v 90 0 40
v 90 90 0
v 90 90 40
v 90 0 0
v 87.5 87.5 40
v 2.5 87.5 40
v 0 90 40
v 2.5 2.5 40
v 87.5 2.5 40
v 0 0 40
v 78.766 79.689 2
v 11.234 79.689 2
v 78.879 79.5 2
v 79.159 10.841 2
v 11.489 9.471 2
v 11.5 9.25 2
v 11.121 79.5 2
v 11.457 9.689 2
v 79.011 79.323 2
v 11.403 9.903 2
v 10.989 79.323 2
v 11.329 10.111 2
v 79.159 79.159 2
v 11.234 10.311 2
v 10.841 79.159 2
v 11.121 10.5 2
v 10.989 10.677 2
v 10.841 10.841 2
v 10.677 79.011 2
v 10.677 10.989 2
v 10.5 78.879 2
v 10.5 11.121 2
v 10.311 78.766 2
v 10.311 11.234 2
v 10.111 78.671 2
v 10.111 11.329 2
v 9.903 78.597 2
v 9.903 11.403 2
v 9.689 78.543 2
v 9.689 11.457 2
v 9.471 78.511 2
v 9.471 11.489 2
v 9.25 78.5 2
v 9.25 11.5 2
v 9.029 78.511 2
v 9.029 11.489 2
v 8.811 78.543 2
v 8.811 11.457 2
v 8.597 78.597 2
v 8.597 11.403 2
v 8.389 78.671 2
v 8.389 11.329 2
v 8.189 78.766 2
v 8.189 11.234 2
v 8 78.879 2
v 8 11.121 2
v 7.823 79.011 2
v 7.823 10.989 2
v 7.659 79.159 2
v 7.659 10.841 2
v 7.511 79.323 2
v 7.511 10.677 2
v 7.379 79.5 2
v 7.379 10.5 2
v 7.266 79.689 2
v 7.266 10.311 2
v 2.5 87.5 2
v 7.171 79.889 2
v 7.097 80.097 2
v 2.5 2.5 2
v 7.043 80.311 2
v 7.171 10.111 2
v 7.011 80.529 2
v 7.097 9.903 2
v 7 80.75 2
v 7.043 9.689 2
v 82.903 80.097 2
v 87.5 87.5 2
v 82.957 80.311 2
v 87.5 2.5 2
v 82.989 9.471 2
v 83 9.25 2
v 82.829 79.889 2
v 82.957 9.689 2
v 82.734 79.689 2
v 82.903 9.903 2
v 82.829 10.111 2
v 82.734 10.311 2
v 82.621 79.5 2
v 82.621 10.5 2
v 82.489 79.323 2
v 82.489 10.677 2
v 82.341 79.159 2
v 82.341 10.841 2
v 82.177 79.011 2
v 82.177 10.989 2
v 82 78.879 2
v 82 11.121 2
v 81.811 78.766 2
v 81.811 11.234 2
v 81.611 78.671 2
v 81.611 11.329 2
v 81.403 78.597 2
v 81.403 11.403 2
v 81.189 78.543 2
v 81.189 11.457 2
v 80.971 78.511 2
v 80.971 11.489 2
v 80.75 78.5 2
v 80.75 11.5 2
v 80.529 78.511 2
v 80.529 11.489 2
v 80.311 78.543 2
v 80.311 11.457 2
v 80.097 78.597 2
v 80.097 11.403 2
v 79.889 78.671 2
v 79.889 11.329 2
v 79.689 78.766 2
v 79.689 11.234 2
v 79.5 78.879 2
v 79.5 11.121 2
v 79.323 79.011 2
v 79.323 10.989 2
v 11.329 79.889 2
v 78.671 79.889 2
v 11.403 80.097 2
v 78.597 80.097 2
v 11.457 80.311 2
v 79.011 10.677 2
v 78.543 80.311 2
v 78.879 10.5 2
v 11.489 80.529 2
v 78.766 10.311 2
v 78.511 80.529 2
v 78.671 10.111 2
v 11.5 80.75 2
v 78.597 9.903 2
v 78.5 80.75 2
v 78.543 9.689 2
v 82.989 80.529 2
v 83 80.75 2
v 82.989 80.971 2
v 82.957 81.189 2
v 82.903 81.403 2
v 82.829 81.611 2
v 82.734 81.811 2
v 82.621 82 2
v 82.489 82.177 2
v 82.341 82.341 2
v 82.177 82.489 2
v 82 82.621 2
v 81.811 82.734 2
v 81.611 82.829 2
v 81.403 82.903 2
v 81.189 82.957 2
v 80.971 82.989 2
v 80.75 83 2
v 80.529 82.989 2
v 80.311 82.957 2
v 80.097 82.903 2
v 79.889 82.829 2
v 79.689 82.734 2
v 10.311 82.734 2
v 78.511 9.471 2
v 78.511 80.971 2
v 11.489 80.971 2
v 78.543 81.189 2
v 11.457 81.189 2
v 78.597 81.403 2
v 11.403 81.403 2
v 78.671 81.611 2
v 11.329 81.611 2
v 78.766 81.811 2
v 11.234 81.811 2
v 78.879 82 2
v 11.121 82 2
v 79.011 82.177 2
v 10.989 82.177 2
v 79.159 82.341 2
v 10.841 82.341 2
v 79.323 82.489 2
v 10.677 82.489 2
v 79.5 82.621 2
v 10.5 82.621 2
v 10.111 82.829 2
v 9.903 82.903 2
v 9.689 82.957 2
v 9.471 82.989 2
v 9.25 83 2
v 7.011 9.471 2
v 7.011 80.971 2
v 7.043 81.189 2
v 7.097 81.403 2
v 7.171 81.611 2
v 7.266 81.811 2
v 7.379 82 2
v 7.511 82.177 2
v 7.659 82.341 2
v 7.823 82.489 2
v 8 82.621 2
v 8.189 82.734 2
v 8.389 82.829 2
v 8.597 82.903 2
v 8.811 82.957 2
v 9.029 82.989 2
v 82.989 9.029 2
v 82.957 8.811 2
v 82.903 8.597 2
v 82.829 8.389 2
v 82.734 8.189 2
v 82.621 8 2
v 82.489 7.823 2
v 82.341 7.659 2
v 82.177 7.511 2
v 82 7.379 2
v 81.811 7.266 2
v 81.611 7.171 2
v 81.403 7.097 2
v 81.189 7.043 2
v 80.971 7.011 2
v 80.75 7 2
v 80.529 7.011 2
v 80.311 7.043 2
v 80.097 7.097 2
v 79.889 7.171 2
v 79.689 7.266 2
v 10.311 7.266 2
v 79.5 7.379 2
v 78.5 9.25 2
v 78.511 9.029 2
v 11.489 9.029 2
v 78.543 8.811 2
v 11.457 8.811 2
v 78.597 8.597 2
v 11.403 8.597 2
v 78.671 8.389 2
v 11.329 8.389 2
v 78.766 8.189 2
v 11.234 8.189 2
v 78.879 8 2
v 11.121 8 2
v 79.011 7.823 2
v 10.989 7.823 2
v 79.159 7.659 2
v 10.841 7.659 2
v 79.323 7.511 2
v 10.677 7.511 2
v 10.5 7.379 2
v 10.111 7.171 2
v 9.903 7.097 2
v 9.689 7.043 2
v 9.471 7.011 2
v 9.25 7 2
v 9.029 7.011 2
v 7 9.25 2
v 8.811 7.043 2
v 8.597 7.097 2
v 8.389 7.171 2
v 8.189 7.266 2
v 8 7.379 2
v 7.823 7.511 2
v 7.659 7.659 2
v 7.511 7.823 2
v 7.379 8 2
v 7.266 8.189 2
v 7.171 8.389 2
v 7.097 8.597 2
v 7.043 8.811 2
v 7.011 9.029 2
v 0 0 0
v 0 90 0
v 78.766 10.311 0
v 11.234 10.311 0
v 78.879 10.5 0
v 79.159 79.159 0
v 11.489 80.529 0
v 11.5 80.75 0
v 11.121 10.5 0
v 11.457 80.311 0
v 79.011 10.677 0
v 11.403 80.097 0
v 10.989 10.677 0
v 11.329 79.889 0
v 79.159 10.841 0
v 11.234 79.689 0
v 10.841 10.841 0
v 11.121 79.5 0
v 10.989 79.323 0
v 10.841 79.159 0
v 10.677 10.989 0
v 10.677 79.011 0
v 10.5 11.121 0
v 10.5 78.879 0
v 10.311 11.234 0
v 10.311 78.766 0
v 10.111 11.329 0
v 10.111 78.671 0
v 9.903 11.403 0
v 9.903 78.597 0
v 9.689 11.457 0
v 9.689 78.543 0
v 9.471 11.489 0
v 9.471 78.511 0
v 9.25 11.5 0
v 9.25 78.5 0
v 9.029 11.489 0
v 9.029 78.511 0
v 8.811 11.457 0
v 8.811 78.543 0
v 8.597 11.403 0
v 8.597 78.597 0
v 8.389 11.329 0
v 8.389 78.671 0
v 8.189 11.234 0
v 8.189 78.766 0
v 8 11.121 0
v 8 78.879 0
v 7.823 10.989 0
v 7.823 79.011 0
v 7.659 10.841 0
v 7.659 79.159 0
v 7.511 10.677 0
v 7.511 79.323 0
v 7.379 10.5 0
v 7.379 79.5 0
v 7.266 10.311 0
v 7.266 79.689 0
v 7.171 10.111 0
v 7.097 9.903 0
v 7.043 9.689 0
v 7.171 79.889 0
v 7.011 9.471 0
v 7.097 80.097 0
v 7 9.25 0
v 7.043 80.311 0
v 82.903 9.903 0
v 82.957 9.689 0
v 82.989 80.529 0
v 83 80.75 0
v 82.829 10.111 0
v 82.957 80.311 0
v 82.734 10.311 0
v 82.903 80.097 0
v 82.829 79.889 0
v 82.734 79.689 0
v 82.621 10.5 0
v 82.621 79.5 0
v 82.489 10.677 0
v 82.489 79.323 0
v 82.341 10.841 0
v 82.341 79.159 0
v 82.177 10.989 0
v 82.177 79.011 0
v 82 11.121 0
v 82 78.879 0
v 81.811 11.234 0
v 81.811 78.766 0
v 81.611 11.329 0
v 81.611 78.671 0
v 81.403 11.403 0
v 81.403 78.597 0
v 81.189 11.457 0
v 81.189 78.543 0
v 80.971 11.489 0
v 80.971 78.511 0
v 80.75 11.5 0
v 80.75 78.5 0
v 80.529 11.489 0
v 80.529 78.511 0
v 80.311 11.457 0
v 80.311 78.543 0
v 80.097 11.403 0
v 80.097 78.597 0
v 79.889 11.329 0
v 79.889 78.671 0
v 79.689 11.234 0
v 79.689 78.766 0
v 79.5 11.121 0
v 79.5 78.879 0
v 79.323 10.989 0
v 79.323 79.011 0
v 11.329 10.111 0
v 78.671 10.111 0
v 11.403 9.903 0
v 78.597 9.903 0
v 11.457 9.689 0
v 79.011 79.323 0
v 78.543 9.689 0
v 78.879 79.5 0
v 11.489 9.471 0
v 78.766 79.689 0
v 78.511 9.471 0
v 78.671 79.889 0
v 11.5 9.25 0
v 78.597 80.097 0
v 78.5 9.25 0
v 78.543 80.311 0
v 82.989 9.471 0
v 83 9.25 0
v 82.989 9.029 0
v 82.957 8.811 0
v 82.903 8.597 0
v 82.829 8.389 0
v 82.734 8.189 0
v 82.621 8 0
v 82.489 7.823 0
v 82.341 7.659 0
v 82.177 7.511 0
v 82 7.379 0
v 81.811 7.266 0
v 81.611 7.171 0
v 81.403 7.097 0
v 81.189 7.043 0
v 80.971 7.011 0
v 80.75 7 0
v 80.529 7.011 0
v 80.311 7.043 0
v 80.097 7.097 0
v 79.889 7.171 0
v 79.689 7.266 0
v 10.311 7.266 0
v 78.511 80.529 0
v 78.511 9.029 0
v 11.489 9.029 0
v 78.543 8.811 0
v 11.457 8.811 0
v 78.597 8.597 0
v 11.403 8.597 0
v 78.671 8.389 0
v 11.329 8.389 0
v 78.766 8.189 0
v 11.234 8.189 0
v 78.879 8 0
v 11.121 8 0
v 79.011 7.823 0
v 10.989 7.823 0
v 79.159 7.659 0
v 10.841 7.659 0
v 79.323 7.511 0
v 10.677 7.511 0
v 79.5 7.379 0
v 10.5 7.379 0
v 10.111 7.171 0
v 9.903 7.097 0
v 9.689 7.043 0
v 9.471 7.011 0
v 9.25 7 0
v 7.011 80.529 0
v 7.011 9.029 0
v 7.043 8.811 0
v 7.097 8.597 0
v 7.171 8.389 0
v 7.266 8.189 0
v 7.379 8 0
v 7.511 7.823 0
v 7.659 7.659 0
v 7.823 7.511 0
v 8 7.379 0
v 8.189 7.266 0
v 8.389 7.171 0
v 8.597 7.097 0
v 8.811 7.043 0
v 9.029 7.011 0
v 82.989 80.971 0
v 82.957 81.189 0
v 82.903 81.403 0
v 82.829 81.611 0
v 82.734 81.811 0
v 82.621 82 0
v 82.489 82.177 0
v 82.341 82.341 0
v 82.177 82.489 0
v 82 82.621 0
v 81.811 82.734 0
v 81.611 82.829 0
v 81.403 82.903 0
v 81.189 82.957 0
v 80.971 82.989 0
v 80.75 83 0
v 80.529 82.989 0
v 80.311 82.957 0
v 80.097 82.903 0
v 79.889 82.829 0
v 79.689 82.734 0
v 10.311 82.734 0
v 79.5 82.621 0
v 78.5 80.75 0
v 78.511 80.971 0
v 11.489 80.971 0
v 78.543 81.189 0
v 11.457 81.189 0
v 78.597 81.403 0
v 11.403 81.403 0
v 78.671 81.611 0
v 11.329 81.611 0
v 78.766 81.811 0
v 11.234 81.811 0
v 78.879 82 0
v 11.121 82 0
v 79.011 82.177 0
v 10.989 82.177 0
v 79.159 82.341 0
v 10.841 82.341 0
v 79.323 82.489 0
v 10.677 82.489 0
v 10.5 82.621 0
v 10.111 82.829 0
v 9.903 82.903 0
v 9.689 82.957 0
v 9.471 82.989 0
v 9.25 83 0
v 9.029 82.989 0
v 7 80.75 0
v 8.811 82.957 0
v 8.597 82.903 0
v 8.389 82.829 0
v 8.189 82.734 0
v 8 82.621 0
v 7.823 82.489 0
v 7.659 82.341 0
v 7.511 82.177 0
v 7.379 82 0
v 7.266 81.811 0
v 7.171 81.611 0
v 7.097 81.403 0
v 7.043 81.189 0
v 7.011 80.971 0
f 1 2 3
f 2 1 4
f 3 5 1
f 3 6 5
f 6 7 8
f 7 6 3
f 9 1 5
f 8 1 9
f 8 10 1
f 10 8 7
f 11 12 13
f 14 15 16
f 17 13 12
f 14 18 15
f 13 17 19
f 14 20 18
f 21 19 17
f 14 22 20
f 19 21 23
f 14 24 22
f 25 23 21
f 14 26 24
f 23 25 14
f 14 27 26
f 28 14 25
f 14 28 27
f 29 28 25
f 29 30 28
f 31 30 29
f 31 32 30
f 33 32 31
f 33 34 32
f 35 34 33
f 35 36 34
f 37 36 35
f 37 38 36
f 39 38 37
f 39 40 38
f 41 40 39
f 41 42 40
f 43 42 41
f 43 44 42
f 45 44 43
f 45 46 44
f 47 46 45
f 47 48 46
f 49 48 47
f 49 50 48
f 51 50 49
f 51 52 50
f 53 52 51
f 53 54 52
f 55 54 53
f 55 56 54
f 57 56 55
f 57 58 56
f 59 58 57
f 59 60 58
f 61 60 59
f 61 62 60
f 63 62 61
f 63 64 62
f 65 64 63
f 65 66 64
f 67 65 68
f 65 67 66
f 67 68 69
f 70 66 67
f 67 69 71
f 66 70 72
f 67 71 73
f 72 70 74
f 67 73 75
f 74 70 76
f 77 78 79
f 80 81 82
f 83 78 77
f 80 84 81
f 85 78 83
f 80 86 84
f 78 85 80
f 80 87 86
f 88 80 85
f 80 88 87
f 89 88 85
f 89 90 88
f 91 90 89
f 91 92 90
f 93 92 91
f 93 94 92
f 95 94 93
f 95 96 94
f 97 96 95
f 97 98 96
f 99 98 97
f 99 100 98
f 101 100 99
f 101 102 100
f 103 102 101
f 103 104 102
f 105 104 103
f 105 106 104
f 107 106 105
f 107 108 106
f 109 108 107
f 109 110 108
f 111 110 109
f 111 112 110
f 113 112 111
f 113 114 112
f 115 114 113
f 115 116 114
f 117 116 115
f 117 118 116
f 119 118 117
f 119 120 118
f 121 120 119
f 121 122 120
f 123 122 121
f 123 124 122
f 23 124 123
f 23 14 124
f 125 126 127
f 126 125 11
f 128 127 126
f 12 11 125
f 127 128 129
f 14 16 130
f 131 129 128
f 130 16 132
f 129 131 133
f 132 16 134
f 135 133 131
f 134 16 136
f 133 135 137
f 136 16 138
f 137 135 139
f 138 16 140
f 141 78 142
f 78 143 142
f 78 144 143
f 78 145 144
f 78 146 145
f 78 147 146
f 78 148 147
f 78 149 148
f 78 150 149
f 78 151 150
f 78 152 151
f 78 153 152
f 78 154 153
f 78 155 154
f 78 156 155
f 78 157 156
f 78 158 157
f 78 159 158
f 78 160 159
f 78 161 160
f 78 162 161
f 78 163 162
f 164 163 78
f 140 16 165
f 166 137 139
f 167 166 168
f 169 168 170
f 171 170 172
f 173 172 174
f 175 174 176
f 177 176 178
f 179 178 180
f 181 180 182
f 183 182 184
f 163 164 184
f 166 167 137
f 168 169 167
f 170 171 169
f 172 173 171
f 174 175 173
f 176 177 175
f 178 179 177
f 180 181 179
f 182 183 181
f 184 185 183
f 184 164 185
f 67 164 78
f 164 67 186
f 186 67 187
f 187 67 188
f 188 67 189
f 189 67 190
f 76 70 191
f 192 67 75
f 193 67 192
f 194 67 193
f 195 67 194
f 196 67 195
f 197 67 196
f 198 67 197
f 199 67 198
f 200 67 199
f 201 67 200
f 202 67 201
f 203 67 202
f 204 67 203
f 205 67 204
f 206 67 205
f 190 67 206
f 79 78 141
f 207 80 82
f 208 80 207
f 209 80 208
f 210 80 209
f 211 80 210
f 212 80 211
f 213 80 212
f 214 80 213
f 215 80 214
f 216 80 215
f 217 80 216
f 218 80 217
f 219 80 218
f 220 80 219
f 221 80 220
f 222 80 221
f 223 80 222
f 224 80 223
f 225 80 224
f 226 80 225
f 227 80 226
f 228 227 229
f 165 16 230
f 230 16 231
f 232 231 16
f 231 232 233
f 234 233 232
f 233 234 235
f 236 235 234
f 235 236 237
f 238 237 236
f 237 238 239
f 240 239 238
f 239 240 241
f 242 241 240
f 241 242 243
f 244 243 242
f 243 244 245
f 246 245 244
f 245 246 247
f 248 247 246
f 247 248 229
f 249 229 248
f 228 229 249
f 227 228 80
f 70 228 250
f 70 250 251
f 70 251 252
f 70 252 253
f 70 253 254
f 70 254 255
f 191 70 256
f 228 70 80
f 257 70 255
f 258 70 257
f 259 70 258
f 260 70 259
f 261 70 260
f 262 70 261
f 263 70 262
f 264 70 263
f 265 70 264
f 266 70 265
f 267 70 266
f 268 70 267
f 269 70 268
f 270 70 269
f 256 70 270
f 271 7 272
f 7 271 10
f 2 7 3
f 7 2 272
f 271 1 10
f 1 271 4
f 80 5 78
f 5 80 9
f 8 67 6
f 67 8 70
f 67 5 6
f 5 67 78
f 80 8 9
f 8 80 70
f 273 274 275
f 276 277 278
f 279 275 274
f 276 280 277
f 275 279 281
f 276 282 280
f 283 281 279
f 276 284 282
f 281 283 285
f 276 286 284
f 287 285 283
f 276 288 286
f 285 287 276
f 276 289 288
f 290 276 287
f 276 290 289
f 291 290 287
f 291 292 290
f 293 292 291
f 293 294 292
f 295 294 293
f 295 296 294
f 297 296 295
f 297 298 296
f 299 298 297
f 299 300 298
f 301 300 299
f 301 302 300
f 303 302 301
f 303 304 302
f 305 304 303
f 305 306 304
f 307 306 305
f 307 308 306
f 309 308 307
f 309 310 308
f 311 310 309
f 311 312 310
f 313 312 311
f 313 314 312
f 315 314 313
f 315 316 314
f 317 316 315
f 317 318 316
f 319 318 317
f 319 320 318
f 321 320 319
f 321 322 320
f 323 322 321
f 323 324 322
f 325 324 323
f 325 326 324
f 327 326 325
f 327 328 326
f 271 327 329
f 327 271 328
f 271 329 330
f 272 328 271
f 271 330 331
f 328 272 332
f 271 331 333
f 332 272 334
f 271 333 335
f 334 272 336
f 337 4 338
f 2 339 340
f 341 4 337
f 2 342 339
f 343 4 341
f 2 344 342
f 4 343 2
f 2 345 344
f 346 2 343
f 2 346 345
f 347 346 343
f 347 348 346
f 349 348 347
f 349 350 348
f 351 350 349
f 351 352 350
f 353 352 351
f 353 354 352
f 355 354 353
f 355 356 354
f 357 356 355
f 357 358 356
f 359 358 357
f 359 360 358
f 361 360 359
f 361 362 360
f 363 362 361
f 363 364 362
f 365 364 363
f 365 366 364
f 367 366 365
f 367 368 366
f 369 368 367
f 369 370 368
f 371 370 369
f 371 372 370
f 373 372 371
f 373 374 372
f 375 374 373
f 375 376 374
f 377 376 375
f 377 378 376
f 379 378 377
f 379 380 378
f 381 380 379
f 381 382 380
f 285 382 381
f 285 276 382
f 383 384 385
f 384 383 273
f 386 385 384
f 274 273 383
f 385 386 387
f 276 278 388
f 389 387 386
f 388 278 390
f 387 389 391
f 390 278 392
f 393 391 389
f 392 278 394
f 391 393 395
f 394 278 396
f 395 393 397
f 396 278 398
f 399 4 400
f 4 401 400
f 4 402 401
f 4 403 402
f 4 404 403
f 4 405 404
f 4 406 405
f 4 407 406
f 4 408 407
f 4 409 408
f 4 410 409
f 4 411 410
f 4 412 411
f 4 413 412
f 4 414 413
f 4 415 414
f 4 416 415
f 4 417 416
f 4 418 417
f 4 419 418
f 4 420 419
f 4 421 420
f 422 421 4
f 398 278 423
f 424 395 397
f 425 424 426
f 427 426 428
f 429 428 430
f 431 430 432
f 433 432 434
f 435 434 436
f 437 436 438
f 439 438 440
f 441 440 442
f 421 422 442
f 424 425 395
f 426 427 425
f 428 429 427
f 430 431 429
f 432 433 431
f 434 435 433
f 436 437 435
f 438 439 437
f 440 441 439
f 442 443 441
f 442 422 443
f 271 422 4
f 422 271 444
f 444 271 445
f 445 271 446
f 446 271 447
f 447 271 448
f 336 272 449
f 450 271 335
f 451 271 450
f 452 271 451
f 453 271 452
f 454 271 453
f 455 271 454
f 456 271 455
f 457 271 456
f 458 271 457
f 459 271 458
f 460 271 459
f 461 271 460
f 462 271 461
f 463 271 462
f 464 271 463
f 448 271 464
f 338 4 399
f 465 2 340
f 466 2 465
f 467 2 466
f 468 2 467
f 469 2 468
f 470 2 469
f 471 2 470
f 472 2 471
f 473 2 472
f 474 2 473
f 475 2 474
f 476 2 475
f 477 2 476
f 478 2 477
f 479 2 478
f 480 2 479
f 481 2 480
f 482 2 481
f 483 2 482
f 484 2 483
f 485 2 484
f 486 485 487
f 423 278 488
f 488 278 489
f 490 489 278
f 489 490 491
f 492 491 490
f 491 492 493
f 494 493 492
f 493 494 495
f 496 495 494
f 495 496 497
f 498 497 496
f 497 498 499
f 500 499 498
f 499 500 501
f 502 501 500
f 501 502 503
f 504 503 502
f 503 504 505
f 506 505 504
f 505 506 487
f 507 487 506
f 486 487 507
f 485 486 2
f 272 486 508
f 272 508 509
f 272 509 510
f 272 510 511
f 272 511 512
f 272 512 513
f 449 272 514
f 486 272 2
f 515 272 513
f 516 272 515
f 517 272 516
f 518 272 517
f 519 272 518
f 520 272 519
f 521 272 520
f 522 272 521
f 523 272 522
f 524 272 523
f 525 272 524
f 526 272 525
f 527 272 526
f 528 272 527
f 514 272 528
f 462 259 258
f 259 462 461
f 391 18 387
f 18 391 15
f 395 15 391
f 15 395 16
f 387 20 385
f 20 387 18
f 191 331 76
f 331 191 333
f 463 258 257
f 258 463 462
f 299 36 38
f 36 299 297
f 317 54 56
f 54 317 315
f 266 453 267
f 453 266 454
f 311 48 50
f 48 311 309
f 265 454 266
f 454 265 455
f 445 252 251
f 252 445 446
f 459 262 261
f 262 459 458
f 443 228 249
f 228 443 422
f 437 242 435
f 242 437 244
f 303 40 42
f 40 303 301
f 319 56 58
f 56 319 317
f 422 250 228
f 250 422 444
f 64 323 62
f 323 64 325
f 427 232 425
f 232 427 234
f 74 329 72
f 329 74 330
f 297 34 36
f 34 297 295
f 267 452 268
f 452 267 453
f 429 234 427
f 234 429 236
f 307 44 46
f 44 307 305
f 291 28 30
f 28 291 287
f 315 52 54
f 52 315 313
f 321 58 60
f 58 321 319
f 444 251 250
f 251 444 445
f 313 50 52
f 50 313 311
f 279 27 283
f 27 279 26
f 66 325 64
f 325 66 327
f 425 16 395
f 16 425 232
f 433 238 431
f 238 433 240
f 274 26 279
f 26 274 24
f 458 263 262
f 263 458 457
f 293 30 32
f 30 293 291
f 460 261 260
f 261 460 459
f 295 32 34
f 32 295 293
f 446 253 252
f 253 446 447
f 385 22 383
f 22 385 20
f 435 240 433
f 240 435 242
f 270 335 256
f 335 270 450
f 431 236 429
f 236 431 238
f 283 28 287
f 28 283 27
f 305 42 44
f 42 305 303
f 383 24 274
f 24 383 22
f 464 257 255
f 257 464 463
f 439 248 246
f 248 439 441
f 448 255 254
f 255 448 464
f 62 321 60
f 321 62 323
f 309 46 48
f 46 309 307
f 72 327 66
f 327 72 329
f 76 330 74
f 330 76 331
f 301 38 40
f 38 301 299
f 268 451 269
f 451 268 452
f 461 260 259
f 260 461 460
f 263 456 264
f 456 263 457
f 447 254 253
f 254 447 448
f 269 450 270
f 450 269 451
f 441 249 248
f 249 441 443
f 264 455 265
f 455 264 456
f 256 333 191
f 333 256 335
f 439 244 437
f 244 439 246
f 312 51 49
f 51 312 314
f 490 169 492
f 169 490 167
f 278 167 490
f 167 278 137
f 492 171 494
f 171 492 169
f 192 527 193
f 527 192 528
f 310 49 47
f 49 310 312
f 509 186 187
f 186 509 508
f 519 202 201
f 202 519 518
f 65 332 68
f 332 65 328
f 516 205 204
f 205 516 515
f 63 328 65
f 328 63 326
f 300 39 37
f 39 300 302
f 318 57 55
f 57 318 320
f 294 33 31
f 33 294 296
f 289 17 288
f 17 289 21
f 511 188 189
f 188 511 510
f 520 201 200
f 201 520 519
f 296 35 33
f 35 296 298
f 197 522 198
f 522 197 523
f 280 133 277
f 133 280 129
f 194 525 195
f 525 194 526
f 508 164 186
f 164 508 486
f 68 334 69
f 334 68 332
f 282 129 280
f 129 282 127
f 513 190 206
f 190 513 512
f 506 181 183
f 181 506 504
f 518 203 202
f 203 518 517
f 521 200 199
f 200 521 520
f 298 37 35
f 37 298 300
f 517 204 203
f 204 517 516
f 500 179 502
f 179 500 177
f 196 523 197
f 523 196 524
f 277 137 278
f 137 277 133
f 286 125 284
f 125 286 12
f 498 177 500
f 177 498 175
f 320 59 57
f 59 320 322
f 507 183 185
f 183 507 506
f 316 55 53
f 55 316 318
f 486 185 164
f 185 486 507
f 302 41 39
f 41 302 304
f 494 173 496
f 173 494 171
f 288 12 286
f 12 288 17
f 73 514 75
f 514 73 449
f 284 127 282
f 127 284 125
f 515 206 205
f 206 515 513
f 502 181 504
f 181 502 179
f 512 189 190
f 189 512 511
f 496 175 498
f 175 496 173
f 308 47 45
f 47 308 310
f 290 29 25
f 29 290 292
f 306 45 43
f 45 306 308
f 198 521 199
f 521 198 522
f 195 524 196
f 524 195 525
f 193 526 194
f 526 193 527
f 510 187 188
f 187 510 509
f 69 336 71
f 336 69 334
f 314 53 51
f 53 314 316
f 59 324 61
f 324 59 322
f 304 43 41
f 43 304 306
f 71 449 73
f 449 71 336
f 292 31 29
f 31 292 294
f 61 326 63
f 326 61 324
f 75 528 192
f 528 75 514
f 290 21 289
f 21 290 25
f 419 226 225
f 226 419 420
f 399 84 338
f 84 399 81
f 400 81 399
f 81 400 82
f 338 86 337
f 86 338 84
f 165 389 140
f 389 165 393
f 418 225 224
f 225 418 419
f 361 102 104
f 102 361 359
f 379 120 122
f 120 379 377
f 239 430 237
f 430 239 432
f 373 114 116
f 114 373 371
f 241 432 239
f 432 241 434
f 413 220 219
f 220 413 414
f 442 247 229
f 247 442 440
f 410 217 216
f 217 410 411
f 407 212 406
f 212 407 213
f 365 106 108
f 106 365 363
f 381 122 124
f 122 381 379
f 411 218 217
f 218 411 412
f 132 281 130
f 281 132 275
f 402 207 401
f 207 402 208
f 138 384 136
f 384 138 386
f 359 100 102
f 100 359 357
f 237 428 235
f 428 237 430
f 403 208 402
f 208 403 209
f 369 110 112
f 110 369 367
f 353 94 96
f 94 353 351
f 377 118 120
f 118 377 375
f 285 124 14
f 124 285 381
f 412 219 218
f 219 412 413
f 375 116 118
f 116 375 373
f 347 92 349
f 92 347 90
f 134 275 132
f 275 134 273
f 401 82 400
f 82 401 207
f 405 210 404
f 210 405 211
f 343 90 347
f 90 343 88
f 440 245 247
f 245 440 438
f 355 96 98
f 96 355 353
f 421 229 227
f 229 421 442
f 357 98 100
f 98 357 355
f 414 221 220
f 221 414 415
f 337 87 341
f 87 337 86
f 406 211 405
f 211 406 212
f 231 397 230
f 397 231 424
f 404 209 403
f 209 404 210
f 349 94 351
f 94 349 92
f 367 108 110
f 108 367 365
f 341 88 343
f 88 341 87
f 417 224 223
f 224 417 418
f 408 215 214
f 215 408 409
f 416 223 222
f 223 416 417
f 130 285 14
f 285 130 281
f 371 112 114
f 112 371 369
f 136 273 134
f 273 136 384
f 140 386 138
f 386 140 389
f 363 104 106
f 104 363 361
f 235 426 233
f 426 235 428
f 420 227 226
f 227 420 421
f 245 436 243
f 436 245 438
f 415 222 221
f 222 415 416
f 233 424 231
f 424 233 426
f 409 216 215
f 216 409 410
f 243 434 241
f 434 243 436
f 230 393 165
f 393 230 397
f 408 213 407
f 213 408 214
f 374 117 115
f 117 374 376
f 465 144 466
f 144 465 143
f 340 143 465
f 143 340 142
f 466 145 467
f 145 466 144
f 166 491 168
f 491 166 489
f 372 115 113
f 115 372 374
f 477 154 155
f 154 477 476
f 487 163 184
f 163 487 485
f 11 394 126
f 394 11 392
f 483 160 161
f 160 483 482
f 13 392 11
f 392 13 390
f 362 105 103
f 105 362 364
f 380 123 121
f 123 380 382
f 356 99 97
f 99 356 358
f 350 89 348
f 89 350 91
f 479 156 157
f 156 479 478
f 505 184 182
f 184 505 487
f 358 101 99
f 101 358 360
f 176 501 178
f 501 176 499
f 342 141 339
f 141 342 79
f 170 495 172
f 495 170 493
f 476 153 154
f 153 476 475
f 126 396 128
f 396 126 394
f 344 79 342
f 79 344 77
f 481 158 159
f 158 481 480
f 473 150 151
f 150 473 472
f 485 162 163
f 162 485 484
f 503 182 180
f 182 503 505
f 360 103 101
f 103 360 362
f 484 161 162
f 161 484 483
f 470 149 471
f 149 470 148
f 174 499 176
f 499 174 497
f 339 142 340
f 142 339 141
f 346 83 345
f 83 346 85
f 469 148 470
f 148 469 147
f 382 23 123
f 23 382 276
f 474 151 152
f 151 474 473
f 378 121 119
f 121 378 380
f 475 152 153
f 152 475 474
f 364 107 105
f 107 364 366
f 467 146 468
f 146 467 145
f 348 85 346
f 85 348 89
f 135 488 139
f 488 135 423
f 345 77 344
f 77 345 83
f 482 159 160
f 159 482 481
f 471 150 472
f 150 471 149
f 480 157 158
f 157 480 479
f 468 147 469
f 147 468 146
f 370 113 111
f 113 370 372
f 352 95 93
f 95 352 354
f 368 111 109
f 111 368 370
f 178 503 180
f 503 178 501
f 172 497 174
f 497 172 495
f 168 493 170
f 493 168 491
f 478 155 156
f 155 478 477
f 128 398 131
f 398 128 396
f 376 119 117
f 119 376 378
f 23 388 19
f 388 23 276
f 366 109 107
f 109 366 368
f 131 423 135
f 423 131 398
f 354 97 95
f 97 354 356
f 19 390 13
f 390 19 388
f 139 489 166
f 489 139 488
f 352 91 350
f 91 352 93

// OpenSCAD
// --- Dimensions (mm) ---
outer_width = 90;          // Outer width and length of the box
outer_depth = 90;          // Outer depth and length of the box
wall_thickness = 2.5;       // Thickness of the four side walls
top_plate_thickness = 2;    // Thickness of the top plate (resting on bed)
total_height = 40;          // Total height of the housing
screw_hole_diameter = 4.5;  // Diameter for M4 screw holes
screw_pattern_size = 71.5;  // Distance between screw holes (center to center)
notch_width = 12;           // Width of the cable notch
notch_depth = 8;            // Depth of the notch from the open top
$fn = 64;                   // Smoothness for holes and cylinders

// --- Implementation ---

// The model is printed upside down: 
// The top plate is at Z = 0 to Z = top_plate_thickness.
// The walls rise from the plate up to Z = total_height.

module housing() {
    difference() {
        // Main Body (The outer shell)
        union() {
            // The Top Plate (Base of the box when upright, on bed when printing)
            cube([outer_width, outer_depth, top_plate_thickness]);
            
            // The Four Walls
            // We use a single cube and subtract the interior to ensure 
            // the walls are exactly the specified thickness.
            translate([0, 0, top_plate_thickness])
            difference() {
                // Outer volume of the walls
                cube([outer_width, outer_depth, total_height - top_plate_thickness]);
                
                // Hollow out the inside
                // We subtract a cube that is smaller by 2 * wall_thickness
                translate([wall_thickness, wall_thickness, -0.01])
                cube([outer_width - 2 * wall_thickness, outer_depth - 2 * wall_thickness, total_height]);
            }
        }

        // Screw Holes (M4)
        // Positioned on the top plate (Z=0 to Z=2).
        // Centered on the plate (45, 45).
        for (i = [-1, 1], j = [-1, 1]) {
            translate([
                (outer_width / 2) + (i * screw_pattern_size / 2), 
                (outer_depth / 2) + (j * screw_pattern_size / 2), 
                -0.01 // Cut through the bottom of the plate
            ])
            cylinder(h = top_plate_thickness + 0.02, d = screw_hole_diameter);
        }

        // Cable Notch
        // Located in one wall, centered along the wall, 
        // reaching 8mm down from the open edge (z = 32 to z = 40).
        // Since we are printing upside down, the "open edge" is at Z = 40.
        // The notch is cut from the top of the walls.
        // We use a slightly wider/deeper cut to ensure no zero-thickness faces.
        translate([
            (outer_width / 2) - wall_thickness, // Positioned at the edge of one wall
            (outer_depth / 2) - (notch_width / 2), 
            total_height - notch_depth // Starts at Z=32
        ])
        cube([wall_thickness + 0.1, notch_width, notch_depth + 0.1]);
    }
}

// Render the part
housing();
